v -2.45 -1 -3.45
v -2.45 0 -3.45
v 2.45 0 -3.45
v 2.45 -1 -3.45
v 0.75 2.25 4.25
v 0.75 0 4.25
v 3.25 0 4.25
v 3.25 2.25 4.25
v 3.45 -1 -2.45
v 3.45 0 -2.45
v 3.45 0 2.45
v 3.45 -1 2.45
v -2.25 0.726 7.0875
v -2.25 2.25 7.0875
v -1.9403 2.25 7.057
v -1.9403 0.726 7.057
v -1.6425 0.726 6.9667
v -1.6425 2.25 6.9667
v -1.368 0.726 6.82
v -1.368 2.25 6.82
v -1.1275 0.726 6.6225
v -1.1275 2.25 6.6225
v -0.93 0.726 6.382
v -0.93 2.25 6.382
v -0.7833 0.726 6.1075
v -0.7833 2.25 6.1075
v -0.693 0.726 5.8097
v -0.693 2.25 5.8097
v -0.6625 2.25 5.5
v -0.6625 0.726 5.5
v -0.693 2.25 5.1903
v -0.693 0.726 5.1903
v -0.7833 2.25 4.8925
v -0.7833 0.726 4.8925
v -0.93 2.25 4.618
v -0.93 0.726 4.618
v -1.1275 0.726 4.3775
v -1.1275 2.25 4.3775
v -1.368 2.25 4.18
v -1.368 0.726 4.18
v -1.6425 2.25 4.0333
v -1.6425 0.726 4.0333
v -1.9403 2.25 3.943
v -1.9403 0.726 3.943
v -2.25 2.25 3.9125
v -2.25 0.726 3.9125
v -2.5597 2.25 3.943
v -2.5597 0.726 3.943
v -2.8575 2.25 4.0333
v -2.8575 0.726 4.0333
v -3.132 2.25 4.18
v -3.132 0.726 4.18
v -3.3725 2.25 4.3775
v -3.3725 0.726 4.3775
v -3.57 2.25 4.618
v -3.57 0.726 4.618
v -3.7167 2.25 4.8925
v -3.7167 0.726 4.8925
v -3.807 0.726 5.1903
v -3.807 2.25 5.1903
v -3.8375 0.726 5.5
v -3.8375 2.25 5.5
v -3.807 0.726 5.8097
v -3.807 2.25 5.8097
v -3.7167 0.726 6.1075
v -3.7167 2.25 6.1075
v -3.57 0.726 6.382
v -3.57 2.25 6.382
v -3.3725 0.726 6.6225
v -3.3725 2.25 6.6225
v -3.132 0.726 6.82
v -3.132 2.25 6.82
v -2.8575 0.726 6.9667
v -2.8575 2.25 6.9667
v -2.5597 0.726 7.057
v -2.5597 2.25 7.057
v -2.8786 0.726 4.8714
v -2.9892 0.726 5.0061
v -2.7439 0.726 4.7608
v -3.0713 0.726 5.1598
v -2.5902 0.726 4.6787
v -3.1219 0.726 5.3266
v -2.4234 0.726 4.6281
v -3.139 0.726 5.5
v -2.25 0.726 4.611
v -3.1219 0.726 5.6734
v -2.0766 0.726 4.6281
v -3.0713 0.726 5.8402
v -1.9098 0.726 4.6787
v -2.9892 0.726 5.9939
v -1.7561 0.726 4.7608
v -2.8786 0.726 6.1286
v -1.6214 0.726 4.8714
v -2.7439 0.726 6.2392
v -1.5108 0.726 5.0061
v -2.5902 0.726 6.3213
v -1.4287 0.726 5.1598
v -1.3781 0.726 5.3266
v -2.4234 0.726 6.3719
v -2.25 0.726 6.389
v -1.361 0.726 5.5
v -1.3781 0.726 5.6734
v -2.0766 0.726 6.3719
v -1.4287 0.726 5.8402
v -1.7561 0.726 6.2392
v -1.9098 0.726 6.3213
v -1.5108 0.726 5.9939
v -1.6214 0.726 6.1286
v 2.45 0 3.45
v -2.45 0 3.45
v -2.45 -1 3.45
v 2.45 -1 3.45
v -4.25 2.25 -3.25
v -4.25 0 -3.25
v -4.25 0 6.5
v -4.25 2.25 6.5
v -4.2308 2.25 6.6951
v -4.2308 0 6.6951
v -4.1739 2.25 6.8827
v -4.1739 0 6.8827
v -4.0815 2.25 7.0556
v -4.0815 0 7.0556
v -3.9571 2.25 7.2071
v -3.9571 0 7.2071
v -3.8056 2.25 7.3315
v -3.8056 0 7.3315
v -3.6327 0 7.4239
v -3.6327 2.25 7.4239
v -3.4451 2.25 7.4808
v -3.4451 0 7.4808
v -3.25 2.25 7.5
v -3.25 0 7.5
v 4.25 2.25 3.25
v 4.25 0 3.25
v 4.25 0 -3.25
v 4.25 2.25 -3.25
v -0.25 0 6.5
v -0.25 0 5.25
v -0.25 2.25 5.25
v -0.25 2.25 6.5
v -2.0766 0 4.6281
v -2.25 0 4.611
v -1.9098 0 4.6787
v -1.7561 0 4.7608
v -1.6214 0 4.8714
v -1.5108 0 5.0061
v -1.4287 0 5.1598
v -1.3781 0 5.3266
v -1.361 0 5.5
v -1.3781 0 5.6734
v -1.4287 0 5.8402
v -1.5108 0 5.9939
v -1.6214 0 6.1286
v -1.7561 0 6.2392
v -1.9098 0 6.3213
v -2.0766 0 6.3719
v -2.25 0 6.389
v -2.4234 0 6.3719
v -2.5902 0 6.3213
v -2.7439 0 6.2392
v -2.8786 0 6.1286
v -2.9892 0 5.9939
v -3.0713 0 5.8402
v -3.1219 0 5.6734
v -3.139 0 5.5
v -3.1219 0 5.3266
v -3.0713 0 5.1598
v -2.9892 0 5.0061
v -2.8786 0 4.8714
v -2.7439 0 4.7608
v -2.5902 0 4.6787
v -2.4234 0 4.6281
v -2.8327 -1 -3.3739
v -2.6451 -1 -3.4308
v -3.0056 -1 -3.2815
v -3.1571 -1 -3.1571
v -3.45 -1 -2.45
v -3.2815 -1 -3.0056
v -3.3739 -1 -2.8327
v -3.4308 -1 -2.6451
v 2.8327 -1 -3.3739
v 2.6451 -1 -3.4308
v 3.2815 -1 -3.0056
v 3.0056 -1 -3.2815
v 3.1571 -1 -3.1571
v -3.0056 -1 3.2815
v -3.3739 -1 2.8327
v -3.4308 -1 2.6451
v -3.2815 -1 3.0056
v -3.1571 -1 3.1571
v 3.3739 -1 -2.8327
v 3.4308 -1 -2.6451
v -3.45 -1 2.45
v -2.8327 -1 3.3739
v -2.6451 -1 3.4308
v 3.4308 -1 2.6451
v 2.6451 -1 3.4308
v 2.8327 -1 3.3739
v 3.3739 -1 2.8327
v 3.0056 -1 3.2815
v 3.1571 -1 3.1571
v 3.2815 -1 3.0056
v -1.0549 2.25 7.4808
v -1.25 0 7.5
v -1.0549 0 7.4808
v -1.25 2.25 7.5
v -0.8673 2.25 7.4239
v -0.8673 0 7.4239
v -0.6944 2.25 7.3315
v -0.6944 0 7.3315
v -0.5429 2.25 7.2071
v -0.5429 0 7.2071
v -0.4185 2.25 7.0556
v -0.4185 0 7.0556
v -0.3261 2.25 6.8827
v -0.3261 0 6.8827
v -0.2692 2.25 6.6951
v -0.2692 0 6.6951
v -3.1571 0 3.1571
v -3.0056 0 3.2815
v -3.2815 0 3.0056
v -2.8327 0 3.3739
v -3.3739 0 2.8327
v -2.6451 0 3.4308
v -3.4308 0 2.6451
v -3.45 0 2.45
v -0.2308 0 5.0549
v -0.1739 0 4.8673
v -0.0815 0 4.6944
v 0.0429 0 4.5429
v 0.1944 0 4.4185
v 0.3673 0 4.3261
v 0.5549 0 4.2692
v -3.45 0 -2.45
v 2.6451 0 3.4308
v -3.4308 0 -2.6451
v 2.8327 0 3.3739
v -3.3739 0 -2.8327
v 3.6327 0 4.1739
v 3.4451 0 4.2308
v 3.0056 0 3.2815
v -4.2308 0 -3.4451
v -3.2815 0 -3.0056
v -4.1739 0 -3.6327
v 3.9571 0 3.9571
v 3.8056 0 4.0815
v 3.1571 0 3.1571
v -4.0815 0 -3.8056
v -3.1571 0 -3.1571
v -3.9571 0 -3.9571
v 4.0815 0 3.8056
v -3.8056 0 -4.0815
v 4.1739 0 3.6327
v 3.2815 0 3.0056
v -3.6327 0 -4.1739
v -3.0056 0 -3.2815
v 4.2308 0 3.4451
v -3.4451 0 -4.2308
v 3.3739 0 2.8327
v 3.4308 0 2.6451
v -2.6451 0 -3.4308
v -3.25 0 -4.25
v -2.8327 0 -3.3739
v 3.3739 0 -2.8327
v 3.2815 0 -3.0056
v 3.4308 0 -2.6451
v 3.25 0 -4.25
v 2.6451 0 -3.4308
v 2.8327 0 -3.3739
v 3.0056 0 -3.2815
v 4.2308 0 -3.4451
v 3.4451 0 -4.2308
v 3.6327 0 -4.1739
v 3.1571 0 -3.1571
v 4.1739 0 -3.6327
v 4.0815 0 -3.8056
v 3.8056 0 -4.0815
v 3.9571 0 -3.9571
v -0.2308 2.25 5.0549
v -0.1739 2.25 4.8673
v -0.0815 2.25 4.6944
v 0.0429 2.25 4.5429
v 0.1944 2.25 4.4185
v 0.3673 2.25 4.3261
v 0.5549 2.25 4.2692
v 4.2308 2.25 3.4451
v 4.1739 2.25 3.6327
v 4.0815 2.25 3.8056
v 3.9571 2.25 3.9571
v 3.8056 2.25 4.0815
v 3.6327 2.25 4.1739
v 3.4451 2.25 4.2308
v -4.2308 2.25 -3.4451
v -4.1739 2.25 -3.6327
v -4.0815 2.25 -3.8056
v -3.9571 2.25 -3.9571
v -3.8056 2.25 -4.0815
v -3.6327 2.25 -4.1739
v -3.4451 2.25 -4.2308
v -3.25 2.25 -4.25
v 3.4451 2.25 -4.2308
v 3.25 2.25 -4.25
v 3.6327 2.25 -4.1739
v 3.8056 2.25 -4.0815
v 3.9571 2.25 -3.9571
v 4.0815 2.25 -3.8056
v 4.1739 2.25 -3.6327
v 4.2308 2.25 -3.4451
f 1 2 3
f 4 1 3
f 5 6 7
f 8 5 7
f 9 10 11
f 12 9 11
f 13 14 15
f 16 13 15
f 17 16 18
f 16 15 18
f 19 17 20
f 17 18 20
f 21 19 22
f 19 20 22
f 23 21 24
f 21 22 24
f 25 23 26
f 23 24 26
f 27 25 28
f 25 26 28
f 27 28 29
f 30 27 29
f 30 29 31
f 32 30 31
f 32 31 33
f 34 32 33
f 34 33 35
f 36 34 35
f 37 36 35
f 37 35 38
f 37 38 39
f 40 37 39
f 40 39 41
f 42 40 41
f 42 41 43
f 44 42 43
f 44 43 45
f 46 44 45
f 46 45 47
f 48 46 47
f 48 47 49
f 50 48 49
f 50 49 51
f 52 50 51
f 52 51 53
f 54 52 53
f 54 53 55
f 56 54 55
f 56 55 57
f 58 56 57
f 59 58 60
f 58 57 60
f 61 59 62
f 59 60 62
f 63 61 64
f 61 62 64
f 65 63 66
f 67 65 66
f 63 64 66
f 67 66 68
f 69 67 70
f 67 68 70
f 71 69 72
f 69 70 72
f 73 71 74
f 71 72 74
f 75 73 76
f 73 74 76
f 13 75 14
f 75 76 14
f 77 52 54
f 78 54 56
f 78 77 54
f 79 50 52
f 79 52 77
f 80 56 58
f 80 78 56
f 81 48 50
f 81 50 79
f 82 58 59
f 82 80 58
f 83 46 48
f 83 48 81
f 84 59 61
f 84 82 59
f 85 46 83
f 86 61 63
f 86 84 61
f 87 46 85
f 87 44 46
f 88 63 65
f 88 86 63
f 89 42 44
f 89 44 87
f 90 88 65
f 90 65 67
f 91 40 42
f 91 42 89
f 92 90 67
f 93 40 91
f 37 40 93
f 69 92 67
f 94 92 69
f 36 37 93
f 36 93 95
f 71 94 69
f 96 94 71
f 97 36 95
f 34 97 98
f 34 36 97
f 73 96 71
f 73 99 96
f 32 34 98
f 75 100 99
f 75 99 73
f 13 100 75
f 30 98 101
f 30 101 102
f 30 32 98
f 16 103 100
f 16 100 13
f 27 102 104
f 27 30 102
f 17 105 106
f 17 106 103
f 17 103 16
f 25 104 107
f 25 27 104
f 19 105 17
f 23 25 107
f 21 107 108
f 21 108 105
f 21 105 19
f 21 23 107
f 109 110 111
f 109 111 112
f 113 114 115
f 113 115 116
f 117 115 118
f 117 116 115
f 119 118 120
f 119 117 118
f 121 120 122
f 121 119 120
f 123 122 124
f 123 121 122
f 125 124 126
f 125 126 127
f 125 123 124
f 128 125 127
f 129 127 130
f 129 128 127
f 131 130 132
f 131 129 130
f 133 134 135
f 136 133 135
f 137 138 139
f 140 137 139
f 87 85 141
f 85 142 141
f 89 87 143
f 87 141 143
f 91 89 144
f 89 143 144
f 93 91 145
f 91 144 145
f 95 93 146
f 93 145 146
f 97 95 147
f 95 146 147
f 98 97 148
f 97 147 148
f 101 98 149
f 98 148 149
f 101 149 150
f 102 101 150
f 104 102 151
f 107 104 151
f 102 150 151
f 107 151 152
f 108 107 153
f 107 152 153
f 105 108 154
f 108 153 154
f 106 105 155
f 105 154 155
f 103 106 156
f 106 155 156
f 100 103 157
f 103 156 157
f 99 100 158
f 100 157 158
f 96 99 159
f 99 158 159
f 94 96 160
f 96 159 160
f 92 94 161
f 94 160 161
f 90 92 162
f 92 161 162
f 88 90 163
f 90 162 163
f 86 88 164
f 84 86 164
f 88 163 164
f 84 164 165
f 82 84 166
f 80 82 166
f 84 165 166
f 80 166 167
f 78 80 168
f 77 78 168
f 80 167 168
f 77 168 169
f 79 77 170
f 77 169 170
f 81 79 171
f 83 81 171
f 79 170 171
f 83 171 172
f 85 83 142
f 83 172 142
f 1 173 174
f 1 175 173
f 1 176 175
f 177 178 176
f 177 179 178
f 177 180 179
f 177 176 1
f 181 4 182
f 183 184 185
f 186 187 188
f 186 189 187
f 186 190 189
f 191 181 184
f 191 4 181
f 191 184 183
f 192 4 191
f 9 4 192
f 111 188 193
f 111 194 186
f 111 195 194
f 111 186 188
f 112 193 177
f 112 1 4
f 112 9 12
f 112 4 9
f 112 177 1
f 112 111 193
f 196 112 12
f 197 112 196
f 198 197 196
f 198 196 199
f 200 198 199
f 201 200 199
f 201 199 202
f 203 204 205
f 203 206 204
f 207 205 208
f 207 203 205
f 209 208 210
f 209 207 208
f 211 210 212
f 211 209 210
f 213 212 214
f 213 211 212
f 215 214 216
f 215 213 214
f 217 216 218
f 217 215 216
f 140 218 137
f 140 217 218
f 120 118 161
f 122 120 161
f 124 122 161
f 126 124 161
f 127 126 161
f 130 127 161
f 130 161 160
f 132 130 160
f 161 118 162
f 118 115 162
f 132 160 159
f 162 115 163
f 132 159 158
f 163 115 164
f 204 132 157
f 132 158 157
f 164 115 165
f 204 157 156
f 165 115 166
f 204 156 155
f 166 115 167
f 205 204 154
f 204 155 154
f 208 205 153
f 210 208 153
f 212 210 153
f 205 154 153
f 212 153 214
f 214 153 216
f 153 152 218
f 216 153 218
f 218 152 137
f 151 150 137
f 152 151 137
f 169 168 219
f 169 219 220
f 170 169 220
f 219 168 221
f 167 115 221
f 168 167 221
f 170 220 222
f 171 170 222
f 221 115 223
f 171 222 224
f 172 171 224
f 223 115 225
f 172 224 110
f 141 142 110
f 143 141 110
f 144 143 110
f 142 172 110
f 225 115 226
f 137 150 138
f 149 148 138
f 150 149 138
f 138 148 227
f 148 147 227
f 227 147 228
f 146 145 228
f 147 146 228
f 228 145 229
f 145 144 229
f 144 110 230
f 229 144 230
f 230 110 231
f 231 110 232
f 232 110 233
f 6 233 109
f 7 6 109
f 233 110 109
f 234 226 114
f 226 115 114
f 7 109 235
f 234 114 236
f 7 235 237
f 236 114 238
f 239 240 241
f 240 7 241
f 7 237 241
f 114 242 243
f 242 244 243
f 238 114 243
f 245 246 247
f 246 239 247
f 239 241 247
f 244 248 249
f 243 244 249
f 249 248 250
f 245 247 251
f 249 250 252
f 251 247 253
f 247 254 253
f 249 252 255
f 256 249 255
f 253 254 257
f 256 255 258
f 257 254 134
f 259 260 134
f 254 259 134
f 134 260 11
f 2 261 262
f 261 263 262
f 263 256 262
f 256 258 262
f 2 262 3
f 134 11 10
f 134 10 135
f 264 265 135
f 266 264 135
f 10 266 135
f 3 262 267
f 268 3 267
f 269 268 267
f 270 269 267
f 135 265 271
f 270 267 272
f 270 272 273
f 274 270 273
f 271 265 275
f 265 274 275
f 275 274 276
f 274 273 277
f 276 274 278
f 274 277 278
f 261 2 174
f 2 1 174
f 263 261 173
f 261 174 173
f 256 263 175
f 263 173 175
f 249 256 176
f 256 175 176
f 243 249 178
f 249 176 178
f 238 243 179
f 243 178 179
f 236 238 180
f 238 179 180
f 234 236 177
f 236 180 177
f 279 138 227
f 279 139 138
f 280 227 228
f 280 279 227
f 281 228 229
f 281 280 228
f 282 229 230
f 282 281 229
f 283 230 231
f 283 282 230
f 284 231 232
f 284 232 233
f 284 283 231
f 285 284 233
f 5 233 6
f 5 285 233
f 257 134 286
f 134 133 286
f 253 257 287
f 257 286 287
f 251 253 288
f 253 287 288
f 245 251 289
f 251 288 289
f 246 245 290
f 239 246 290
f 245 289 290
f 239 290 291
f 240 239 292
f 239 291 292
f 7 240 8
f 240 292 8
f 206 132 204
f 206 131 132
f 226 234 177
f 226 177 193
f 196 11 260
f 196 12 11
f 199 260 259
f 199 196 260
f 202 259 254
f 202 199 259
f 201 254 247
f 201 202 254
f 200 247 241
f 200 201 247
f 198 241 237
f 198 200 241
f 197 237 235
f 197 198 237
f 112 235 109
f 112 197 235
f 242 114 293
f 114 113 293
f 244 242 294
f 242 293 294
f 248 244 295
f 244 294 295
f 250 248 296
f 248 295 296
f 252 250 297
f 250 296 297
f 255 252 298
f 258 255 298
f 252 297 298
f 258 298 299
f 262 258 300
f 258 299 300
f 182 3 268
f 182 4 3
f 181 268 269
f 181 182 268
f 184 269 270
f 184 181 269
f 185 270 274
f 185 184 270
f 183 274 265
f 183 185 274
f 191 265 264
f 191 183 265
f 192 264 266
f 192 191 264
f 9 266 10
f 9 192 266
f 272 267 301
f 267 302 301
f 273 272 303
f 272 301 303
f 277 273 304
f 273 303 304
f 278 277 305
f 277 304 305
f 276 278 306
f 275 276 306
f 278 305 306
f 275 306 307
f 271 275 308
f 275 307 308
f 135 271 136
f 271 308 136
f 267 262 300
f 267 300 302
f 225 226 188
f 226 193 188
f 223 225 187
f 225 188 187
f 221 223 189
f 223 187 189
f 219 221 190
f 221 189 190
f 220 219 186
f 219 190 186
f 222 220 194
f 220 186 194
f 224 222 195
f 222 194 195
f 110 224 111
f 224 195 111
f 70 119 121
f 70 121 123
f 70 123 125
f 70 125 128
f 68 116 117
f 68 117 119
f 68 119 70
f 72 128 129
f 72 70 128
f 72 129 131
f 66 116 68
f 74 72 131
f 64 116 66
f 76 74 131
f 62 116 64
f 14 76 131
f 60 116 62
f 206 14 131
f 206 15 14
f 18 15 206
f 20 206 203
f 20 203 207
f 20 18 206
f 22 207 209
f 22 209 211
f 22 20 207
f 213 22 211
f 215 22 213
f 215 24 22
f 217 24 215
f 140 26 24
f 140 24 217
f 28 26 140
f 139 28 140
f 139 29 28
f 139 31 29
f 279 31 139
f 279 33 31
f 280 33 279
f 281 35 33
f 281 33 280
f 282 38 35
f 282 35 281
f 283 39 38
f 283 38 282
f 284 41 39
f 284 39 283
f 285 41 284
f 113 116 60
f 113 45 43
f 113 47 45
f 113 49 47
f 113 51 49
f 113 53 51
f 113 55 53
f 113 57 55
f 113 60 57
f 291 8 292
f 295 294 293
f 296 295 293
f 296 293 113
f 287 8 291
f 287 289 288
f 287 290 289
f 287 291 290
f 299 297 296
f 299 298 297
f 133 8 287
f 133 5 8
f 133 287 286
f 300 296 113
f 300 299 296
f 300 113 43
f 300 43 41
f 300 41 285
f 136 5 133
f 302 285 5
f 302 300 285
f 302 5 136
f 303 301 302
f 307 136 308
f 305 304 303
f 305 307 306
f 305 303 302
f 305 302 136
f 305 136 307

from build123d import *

# Parameters (mm, degrees)
SKETCH1_W                                      = 8.5
SKETCH1_H                                      = 8.5
EXTRUDE1_DEPTH                                 = 2.25
SKETCH7_W                                      = 6.9
SKETCH7_H                                      = 6.9
EXTRUDE5_DEPTH                                 = 1
SKETCH3_W                                      = 4
SKETCH3_H                                      = 2.25
EXTRUDE3_DEPTH                                 = 3.25
CBORE_FOR_0_SOCKET_HEAD_CAP_SCREW1_D           = 1.778
CBORE_FOR_0_SOCKET_HEAD_CAP_SCREW1_CBORE_D     = 3.175
CBORE_FOR_0_SOCKET_HEAD_CAP_SCREW1_CBORE_DEPTH = 1.524
FILLET2_R                                      = 1


with BuildPart() as part:
    # Sketch1 → Extrude1 (new body)
    with BuildSketch(Plane(origin=(0, 0, 0), x_dir=(1, 0, 0), z_dir=(0, 1, 0))):
        Rectangle(SKETCH1_W, SKETCH1_H)
    extrude(amount=EXTRUDE1_DEPTH)

    # Sketch7 → Extrude5 (add)
    with BuildSketch(Plane.XZ):
        Rectangle(SKETCH7_W, SKETCH7_H)
    extrude(amount=EXTRUDE5_DEPTH)

    # Sketch3 → Extrude3 (add)
    with BuildSketch(Plane.XY.offset(4.25)):
        with Locations((-2.25, 1.125)):
            Rectangle(SKETCH3_W, SKETCH3_H)
    extrude(amount=EXTRUDE3_DEPTH)

    # CBORE for #0 Socket Head Cap Screw1 (through all)
    with Locations(Plane(origin=(-2.25, 2.25, 5.5), x_dir=(0, 0, 1), z_dir=(0, 1, 0))):
        with Locations((0, 0)):
            CounterBoreHole(CBORE_FOR_0_SOCKET_HEAD_CAP_SCREW1_D / 2, CBORE_FOR_0_SOCKET_HEAD_CAP_SCREW1_CBORE_D / 2, CBORE_FOR_0_SOCKET_HEAD_CAP_SCREW1_CBORE_DEPTH)

    # Fillet2
    fillet2_edges = [part.edges().sort_by_distance(p)[0] for p in [
        (-3.45, -0.5, -3.45),
        (-4.25, 1.125, -4.25),
        (-3.45, -0.5, 3.45),
        (3.45, -0.5, -3.45),
        (3.45, -0.5, 3.45),
        (4.25, 1.125, -4.25),
        (4.25, 1.125, 4.25),
        (-4.25, 1.125, 7.5),
        (-0.25, 1.125, 7.5),
        (-0.25, 1.125, 4.25),
    ]]
    fillet(fillet2_edges, radius=FILLET2_R)


solid = part.part
